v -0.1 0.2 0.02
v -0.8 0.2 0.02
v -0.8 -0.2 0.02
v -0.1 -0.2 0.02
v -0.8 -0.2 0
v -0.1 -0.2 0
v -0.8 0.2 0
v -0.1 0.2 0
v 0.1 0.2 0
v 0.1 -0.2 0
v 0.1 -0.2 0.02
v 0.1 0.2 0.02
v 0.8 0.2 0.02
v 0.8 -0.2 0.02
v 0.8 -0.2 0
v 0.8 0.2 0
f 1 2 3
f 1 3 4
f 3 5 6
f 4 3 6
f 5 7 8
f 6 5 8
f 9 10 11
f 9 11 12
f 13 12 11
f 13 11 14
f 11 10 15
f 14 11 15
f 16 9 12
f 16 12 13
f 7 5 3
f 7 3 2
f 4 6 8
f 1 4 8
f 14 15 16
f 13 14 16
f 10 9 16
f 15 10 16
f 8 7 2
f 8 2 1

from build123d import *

# Parameters (mm, degrees)
SKETCH_1_W        = 0.7
SKETCH_1_H        = 0.4
EXTRUDE_1_DEPTH   = 0.02
EXTRUDE_1_2_DEPTH = 0.02


with BuildPart() as part:
    # 草图1 → 凸台-拉伸1 (new body)
    with BuildSketch(Plane.XY):
        with Locations((-0.45, 0)):
            Rectangle(SKETCH_1_W, SKETCH_1_H)
    extrude(amount=EXTRUDE_1_DEPTH)


with BuildPart() as body_2:
    # 草图1 → Extrude 1 2 (new body)
    with BuildSketch(Plane.XY):
        with Locations((0.45, 0)):
            Rectangle(SKETCH_1_W, SKETCH_1_H)
    extrude(amount=EXTRUDE_1_2_DEPTH)


solid = Compound([part.part, body_2.part])
